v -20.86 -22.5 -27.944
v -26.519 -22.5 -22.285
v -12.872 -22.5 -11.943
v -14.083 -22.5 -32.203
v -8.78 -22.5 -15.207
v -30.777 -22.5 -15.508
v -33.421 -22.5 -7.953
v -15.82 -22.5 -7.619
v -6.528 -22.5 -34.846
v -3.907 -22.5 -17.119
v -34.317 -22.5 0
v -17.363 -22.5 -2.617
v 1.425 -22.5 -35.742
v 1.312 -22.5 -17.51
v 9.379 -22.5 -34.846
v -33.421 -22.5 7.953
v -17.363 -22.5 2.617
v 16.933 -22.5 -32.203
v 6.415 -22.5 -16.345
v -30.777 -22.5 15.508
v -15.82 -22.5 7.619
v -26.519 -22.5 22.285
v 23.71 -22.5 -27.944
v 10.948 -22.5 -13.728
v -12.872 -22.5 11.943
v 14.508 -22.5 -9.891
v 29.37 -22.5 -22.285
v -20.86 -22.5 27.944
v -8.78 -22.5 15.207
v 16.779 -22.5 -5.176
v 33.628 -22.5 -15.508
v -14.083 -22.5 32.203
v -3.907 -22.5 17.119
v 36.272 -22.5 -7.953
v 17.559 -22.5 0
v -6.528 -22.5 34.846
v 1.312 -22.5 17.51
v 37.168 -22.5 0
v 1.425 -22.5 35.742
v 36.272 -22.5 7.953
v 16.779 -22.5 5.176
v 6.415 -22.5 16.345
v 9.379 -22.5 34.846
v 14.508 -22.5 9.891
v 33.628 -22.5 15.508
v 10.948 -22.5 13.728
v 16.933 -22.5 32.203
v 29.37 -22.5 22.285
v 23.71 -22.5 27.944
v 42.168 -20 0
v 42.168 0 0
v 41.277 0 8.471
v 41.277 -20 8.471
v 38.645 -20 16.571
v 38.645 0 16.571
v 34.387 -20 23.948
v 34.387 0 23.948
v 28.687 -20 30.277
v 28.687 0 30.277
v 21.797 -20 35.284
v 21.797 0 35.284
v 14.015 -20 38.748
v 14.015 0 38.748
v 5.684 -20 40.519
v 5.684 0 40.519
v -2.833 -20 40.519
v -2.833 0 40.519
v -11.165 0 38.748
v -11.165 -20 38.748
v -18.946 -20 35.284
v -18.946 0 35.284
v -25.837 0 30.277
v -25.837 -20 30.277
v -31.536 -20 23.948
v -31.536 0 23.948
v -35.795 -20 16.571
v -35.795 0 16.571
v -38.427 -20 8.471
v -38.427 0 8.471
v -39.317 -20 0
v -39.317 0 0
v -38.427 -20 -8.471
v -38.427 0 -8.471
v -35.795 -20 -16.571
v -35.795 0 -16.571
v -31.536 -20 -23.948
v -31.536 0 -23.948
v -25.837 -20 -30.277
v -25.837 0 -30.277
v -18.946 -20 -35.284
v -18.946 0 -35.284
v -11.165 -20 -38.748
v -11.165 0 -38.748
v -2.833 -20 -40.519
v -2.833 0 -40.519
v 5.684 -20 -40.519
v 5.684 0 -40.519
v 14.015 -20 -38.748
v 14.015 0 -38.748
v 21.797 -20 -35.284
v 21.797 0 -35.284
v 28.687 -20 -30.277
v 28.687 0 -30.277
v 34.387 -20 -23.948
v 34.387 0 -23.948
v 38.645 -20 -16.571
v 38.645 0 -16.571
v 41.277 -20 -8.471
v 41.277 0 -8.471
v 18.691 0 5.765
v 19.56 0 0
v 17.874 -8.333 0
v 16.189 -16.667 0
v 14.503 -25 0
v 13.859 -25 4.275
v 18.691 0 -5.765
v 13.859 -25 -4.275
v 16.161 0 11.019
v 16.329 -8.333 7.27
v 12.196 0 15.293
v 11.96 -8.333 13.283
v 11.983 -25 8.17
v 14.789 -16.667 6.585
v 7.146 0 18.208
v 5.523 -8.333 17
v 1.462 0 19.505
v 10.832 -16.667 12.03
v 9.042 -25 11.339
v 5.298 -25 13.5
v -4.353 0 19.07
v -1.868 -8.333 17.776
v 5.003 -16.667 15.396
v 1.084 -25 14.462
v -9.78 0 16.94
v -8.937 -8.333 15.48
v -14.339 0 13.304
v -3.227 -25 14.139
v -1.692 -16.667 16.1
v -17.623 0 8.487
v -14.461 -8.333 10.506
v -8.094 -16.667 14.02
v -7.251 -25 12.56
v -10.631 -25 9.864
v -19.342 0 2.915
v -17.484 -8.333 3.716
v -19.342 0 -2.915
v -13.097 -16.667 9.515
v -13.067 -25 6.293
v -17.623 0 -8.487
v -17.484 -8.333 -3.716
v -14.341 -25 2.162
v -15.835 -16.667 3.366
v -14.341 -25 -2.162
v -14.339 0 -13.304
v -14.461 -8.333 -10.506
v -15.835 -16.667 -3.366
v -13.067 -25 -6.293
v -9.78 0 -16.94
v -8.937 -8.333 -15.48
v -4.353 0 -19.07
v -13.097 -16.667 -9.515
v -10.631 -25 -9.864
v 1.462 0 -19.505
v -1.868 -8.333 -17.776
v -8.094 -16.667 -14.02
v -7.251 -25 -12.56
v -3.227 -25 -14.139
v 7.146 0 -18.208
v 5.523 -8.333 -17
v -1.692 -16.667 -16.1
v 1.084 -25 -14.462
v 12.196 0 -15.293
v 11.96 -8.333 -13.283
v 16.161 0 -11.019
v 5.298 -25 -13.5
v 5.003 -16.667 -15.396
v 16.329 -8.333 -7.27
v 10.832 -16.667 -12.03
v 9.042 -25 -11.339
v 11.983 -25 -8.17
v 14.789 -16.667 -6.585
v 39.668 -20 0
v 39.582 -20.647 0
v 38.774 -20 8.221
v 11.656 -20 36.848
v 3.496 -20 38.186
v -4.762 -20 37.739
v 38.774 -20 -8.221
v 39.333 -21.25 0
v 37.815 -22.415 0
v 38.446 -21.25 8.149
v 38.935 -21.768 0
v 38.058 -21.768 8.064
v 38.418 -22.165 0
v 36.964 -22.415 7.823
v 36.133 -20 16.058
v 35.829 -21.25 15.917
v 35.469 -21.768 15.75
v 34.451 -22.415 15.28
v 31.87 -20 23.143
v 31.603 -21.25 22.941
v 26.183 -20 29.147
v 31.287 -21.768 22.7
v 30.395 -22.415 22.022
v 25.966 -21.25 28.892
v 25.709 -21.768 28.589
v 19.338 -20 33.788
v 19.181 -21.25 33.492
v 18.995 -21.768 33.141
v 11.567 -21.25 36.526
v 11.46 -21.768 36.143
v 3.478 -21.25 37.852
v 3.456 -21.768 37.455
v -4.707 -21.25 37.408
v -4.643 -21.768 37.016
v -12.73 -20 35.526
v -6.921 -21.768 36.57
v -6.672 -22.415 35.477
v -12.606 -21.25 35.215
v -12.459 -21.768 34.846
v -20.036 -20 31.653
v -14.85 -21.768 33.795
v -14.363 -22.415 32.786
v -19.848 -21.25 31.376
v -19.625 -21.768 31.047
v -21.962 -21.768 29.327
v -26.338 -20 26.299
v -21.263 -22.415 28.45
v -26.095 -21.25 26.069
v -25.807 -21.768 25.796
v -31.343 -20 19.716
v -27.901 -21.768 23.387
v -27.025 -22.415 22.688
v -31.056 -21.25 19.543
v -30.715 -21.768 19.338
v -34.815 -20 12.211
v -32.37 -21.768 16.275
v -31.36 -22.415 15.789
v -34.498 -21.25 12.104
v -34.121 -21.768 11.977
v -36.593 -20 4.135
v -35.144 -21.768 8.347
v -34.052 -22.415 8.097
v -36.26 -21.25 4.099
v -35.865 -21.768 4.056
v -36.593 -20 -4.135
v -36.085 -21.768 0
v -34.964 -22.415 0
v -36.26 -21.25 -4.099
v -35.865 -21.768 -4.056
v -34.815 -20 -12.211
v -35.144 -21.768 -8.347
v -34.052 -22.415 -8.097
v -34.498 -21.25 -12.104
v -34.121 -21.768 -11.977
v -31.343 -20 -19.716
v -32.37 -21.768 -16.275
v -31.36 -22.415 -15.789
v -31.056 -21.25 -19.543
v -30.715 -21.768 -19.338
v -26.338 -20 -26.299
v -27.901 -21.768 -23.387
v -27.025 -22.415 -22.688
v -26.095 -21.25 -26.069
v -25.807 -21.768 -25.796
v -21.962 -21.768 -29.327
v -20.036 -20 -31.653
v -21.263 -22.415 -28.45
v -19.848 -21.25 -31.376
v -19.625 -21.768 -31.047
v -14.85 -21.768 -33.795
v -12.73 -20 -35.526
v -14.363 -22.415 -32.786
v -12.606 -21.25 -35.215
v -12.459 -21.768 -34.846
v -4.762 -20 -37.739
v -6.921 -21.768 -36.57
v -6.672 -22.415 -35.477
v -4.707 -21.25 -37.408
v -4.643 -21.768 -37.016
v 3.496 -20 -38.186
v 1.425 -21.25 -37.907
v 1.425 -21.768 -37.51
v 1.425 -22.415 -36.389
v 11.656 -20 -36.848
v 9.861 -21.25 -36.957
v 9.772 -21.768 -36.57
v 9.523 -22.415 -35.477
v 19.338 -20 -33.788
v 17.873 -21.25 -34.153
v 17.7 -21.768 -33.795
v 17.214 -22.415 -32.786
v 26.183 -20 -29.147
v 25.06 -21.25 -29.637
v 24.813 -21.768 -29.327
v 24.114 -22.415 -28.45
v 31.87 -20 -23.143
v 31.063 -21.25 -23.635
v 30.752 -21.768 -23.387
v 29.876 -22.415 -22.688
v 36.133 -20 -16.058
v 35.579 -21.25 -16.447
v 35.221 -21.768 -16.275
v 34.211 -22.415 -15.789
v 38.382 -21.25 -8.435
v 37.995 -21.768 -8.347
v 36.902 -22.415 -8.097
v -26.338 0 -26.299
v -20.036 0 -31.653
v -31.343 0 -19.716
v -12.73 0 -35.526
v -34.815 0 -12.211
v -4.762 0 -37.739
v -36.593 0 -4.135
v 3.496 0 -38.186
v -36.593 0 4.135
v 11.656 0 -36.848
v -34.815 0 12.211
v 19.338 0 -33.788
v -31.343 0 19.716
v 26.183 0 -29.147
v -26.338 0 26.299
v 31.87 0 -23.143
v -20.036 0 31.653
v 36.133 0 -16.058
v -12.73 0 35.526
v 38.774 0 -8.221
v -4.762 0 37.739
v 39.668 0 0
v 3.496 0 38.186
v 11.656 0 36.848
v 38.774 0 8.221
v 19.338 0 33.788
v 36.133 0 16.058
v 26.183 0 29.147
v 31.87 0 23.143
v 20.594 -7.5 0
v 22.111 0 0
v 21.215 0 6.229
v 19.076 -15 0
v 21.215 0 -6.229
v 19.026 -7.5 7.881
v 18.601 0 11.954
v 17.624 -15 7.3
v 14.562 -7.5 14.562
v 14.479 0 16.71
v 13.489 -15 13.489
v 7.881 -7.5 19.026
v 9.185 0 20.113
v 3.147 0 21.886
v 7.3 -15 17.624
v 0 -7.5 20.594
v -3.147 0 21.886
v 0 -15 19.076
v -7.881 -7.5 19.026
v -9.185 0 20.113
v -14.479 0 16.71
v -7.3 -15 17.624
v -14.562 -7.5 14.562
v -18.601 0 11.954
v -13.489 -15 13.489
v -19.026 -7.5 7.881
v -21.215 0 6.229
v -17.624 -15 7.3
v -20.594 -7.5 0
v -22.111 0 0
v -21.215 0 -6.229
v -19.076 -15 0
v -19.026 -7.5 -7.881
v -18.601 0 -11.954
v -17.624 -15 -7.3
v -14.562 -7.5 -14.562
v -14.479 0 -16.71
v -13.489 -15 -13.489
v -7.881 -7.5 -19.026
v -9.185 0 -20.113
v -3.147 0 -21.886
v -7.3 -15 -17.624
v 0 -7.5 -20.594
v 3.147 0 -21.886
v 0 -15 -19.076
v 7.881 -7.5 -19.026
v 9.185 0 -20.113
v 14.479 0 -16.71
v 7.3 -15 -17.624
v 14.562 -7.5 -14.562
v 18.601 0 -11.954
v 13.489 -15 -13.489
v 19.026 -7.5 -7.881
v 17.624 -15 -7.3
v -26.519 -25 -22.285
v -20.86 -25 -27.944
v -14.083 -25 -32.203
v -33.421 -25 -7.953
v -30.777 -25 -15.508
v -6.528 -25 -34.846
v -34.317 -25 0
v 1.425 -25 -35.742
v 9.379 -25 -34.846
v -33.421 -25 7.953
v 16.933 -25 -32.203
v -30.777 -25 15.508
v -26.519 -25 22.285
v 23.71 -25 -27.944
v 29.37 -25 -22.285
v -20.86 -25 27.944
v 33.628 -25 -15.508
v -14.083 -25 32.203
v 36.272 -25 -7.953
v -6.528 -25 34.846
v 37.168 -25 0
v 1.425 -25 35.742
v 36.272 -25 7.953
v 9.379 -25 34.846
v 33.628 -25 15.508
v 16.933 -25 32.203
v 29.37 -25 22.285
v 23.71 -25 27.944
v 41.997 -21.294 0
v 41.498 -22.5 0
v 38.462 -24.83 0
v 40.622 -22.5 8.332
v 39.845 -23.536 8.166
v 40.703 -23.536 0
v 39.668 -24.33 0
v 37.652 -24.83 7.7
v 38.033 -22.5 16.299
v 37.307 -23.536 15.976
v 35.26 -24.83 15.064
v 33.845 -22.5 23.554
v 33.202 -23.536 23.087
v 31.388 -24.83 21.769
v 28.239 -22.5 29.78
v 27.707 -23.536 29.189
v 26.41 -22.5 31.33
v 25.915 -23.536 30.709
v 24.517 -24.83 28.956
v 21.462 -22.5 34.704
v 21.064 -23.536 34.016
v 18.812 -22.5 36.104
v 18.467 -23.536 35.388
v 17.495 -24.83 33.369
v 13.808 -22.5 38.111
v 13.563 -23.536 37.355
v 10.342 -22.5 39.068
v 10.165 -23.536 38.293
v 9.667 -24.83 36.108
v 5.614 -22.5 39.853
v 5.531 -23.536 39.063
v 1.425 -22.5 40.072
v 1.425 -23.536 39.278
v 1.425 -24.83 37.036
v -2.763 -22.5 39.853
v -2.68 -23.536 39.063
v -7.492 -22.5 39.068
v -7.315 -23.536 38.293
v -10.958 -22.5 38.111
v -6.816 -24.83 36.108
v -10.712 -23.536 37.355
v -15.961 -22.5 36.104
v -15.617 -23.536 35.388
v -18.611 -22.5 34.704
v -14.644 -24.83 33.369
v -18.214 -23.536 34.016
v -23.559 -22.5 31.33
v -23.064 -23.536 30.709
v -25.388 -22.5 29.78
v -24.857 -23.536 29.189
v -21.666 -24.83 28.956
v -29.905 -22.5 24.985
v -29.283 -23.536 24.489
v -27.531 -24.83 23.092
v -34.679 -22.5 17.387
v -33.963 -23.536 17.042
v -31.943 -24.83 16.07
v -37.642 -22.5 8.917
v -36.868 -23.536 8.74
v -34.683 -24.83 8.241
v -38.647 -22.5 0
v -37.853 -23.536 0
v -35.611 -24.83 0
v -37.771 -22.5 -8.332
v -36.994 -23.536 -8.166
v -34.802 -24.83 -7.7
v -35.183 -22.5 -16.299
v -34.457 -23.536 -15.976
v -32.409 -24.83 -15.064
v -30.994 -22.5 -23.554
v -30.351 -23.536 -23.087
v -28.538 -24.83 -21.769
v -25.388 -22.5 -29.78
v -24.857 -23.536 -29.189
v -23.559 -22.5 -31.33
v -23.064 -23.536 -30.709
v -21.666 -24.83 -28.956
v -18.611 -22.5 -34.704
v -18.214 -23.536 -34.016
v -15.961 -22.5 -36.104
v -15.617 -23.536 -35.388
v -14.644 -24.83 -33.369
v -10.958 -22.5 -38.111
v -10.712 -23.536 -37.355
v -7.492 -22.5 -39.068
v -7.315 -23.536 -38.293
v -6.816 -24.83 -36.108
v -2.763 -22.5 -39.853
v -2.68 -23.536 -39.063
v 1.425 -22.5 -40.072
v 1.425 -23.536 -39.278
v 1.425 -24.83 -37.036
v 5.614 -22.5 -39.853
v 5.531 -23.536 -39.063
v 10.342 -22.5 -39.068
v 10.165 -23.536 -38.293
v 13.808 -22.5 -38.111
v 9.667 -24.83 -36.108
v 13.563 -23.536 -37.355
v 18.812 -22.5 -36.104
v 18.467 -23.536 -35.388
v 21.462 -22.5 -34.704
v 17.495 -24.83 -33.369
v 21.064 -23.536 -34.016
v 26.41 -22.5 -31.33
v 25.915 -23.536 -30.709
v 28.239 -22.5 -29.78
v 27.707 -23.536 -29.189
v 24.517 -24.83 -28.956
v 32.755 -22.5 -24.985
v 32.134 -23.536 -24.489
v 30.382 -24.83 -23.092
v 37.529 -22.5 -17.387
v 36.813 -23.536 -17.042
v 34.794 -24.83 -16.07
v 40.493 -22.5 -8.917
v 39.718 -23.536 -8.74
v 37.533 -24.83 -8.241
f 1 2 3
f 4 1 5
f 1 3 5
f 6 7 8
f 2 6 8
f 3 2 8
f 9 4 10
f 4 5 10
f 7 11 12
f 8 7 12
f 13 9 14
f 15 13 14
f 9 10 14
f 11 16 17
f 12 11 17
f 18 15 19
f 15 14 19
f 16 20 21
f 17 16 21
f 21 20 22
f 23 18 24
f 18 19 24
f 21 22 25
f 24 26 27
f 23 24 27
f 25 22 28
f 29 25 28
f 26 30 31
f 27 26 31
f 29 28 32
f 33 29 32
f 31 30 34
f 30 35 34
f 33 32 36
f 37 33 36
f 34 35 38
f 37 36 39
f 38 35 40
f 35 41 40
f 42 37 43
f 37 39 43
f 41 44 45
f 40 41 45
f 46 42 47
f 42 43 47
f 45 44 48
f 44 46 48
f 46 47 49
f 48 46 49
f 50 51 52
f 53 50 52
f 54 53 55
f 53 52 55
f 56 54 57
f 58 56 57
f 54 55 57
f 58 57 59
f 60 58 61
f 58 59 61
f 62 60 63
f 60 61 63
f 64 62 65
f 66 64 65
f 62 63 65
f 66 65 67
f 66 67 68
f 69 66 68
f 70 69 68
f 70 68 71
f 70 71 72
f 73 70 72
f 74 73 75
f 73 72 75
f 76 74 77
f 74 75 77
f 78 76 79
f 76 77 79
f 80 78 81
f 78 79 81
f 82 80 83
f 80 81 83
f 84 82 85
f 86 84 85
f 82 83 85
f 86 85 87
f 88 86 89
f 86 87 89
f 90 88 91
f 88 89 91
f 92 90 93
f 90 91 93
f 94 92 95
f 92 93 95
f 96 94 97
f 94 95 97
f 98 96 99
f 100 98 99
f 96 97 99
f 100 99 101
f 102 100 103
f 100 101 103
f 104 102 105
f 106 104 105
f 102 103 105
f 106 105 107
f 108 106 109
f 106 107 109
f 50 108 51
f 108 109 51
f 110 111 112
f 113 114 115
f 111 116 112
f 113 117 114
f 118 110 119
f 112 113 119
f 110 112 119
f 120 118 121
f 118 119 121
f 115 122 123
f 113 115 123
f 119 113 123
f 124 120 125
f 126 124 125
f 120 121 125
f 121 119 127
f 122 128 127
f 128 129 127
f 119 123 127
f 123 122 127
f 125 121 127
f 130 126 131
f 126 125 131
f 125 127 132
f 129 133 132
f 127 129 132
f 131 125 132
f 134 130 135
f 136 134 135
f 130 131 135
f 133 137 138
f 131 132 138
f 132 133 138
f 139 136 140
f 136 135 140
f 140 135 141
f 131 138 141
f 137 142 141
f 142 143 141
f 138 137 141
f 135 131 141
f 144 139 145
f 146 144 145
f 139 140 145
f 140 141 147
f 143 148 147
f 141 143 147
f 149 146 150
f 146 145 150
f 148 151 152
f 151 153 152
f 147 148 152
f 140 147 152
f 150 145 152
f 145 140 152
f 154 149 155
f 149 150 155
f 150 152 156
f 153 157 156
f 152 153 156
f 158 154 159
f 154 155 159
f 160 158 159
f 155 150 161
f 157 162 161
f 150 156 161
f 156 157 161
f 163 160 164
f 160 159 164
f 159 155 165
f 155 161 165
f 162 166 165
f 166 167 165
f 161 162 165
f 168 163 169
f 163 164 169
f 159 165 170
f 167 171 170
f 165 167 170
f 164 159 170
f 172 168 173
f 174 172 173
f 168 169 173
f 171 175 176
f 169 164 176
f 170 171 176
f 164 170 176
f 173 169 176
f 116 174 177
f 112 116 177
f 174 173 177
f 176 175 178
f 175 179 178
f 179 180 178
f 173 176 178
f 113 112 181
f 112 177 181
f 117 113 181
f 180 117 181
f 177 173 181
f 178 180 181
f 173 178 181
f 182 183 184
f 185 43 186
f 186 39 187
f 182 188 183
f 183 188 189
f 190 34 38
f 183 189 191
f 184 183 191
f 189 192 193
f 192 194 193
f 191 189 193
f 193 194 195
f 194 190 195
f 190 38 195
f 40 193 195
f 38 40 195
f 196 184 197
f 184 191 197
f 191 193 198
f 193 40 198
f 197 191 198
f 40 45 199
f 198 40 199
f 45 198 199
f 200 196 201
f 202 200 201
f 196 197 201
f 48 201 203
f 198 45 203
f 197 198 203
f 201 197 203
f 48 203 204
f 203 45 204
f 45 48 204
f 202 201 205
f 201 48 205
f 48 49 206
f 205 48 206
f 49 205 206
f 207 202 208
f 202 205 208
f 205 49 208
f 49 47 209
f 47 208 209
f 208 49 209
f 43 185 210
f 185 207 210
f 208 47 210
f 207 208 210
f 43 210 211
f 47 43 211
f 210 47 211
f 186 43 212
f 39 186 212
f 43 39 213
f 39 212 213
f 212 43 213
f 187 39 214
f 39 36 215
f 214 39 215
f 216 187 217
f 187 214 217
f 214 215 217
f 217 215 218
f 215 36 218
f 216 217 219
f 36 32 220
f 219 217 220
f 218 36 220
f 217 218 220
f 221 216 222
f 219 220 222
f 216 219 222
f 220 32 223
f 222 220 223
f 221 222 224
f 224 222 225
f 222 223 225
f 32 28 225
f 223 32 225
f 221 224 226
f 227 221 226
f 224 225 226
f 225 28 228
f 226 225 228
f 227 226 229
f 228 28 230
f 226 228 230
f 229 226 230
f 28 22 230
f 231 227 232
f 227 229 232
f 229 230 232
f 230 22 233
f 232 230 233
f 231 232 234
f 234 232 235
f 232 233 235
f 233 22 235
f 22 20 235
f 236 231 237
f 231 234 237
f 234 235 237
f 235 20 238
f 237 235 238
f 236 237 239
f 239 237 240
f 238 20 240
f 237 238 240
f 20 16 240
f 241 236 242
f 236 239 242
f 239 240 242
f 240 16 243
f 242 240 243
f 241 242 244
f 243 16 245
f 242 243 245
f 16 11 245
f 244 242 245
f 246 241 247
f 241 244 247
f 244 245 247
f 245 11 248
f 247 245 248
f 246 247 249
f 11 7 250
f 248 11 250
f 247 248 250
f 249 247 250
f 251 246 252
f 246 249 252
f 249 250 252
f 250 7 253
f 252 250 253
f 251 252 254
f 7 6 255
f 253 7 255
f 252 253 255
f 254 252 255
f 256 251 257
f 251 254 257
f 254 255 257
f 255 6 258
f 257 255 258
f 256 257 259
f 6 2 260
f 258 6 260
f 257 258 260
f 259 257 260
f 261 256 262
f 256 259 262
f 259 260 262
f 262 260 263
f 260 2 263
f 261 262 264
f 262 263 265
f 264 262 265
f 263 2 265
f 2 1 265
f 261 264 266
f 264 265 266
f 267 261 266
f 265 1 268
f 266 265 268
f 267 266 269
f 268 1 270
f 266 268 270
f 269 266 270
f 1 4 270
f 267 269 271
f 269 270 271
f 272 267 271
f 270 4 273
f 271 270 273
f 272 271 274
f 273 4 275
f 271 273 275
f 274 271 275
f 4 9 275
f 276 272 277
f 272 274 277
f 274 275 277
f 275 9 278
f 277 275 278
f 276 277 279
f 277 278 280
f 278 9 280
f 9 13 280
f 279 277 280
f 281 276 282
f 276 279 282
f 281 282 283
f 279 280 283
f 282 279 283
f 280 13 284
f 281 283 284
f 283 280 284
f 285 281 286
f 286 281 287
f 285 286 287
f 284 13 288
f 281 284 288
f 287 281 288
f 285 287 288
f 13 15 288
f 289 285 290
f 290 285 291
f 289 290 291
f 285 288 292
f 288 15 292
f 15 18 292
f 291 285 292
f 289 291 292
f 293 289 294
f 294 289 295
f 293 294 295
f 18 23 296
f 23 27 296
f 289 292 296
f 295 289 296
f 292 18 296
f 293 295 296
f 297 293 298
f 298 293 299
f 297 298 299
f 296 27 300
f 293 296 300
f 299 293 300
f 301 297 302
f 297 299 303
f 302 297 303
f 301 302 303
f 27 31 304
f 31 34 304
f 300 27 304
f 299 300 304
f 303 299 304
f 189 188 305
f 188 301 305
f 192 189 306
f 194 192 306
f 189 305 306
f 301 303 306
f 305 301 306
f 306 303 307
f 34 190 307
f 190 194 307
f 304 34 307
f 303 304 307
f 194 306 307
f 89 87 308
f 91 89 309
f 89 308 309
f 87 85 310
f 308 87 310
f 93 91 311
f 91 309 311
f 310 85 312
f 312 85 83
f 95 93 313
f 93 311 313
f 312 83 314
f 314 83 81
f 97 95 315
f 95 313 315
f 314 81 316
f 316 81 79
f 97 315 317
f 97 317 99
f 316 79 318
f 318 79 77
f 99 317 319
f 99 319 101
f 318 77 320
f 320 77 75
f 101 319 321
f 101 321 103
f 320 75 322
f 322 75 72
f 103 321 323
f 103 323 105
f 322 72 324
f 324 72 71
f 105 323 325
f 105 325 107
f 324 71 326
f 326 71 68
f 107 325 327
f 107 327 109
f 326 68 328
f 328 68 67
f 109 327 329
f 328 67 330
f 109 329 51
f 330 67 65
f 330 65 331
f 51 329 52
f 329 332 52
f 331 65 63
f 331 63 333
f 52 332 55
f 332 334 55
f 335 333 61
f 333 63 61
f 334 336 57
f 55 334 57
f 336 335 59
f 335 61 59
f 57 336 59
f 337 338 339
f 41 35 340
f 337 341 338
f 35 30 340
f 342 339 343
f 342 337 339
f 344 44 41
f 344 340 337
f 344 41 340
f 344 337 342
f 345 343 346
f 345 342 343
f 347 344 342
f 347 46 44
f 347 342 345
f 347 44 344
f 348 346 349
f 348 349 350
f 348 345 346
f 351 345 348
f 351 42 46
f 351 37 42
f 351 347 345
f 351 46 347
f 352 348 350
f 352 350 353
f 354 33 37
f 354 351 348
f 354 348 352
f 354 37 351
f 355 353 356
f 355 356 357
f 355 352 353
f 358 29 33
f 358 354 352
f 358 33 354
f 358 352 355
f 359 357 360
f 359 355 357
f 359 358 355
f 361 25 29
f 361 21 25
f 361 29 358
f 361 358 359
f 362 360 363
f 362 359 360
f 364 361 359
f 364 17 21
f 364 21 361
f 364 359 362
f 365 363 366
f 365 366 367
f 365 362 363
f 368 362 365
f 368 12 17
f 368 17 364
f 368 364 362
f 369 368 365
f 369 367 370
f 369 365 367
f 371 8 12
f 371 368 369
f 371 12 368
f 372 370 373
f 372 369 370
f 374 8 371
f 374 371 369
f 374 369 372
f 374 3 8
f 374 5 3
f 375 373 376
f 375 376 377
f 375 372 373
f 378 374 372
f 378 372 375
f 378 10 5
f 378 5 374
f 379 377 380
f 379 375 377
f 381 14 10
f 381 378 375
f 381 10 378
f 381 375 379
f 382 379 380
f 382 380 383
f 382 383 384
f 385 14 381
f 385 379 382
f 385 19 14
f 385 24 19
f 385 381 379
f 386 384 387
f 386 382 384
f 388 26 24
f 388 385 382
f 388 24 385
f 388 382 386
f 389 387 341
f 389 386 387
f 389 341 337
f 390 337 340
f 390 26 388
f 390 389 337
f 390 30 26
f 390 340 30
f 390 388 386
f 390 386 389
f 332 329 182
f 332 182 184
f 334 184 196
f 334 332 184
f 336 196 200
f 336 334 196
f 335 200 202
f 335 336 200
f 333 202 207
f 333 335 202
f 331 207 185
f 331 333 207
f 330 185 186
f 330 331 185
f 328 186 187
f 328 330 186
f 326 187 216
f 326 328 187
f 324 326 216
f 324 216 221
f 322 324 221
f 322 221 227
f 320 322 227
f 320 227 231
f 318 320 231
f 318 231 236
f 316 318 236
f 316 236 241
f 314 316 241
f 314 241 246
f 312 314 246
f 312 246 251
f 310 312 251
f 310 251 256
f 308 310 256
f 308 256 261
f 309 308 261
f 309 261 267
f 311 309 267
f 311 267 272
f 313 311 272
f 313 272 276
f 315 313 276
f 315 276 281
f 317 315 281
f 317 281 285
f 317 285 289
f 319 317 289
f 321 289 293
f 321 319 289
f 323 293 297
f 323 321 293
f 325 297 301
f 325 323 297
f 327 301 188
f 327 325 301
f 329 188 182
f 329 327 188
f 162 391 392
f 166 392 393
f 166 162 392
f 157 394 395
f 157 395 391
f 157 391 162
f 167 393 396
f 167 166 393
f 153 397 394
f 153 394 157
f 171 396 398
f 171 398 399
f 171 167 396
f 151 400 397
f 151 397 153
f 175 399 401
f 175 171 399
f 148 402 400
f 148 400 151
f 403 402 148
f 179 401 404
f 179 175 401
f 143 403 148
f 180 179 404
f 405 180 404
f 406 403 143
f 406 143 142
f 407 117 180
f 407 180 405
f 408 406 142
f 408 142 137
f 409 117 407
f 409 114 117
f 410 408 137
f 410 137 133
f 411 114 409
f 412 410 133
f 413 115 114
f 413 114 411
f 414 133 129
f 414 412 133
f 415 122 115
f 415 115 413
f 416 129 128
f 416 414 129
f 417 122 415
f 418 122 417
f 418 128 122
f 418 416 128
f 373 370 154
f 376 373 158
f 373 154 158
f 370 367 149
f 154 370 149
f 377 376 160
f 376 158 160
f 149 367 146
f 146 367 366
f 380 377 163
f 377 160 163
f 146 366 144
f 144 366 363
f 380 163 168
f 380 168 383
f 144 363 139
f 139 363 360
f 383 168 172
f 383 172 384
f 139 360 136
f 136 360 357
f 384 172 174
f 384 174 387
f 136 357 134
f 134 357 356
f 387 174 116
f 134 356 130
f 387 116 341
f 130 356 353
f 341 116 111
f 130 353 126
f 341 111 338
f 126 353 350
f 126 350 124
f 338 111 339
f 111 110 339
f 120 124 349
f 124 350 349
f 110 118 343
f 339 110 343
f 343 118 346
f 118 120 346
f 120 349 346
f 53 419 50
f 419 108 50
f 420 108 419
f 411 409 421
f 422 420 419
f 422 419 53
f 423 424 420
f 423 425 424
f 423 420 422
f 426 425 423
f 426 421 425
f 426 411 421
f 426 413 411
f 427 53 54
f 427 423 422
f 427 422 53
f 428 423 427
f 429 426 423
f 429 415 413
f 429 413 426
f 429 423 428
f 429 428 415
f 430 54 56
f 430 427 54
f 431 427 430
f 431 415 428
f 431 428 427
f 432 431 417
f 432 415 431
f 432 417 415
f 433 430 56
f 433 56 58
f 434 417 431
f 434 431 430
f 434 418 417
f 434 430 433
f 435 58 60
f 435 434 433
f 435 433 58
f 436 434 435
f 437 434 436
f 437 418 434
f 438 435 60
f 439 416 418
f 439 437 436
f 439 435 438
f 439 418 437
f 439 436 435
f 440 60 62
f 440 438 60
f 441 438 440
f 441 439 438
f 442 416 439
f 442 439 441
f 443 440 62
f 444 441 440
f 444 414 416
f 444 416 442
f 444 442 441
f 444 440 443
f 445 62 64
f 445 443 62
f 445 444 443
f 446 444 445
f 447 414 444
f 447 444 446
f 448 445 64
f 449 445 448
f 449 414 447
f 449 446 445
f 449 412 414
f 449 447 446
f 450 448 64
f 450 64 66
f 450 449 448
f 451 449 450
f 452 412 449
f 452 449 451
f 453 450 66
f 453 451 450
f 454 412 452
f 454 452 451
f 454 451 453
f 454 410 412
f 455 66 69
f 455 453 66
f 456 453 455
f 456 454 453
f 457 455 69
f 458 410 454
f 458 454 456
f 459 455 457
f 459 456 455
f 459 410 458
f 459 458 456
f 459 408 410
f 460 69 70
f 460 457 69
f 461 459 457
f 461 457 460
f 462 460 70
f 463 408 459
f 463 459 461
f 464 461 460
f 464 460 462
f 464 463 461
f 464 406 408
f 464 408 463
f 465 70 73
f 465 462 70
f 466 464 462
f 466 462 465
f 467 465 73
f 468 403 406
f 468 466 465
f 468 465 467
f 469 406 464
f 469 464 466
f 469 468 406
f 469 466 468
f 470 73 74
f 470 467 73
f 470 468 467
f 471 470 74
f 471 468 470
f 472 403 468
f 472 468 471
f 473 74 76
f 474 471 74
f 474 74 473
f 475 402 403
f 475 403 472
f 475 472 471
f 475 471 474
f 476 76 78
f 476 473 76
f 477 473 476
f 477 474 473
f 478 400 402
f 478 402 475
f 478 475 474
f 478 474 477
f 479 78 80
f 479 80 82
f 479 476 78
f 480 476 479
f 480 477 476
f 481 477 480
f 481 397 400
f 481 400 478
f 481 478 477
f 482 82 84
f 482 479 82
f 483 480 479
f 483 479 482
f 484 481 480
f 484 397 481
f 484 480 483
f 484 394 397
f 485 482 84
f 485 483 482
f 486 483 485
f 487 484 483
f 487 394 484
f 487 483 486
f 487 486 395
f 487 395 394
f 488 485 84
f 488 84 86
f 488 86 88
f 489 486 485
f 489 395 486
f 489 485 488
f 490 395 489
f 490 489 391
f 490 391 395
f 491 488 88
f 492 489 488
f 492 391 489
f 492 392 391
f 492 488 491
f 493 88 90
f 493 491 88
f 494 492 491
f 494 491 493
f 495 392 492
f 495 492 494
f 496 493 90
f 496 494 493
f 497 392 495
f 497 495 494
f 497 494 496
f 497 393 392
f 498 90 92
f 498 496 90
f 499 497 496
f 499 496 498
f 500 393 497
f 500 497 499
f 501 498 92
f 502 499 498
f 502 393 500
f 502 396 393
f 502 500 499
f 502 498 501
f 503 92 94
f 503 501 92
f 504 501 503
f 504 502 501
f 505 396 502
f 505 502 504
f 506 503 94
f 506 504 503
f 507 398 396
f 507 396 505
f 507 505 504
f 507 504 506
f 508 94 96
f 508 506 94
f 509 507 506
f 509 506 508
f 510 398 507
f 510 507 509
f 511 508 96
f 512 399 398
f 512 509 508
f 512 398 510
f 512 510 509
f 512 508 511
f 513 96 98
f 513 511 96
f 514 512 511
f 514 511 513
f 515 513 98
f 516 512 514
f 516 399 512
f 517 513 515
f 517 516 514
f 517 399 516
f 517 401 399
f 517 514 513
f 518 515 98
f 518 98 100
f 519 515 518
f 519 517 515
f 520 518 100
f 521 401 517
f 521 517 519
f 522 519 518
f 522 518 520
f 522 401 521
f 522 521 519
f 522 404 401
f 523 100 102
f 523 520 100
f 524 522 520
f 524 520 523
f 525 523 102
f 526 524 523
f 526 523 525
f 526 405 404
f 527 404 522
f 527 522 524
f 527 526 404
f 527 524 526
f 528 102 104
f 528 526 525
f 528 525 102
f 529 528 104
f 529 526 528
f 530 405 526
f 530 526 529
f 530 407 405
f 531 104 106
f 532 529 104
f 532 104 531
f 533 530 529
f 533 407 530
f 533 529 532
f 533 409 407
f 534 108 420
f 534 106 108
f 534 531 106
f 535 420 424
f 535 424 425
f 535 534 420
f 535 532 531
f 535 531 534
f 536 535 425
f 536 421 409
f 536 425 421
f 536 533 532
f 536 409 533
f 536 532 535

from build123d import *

# Parameters (mm, degrees)
F1_R     = 40.7423360253
F2_DEPTH = 25
F3_R     = 19.5601176406
F4_R     = 14.5028723408
F6_R     = 5
F7_T     = -2.5


with BuildPart() as f2:
    # F1 (on Front) → F2 (new body)
    with BuildSketch(Plane.XZ):
        with Locations((1.4253406553, 0)):
            Circle(F1_R)
    extrude(amount=F2_DEPTH)

    # F3 (on Front) → F5 section 0
    with BuildSketch(Plane.XZ):
        Circle(F3_R)
    # F4 (on offset) → F5 section 1
    with BuildSketch(Plane.XZ.offset(25)):
        Circle(F4_R)
    loft(mode=Mode.SUBTRACT)

    # F6
    f6_edges = [f2.edges().sort_by_distance(p)[0] for p in [
        (-39.316995, -25, 0),
    ]]
    fillet(f6_edges, radius=F6_R)

    # F7
    f7_openings = [f2.faces().sort_by_distance(p)[0] for p in [
        (-38.164628, 0, 0),
    ]]
    offset(amount=F7_T, openings=f7_openings, kind=Kind.INTERSECTION)


solid = f2.part
